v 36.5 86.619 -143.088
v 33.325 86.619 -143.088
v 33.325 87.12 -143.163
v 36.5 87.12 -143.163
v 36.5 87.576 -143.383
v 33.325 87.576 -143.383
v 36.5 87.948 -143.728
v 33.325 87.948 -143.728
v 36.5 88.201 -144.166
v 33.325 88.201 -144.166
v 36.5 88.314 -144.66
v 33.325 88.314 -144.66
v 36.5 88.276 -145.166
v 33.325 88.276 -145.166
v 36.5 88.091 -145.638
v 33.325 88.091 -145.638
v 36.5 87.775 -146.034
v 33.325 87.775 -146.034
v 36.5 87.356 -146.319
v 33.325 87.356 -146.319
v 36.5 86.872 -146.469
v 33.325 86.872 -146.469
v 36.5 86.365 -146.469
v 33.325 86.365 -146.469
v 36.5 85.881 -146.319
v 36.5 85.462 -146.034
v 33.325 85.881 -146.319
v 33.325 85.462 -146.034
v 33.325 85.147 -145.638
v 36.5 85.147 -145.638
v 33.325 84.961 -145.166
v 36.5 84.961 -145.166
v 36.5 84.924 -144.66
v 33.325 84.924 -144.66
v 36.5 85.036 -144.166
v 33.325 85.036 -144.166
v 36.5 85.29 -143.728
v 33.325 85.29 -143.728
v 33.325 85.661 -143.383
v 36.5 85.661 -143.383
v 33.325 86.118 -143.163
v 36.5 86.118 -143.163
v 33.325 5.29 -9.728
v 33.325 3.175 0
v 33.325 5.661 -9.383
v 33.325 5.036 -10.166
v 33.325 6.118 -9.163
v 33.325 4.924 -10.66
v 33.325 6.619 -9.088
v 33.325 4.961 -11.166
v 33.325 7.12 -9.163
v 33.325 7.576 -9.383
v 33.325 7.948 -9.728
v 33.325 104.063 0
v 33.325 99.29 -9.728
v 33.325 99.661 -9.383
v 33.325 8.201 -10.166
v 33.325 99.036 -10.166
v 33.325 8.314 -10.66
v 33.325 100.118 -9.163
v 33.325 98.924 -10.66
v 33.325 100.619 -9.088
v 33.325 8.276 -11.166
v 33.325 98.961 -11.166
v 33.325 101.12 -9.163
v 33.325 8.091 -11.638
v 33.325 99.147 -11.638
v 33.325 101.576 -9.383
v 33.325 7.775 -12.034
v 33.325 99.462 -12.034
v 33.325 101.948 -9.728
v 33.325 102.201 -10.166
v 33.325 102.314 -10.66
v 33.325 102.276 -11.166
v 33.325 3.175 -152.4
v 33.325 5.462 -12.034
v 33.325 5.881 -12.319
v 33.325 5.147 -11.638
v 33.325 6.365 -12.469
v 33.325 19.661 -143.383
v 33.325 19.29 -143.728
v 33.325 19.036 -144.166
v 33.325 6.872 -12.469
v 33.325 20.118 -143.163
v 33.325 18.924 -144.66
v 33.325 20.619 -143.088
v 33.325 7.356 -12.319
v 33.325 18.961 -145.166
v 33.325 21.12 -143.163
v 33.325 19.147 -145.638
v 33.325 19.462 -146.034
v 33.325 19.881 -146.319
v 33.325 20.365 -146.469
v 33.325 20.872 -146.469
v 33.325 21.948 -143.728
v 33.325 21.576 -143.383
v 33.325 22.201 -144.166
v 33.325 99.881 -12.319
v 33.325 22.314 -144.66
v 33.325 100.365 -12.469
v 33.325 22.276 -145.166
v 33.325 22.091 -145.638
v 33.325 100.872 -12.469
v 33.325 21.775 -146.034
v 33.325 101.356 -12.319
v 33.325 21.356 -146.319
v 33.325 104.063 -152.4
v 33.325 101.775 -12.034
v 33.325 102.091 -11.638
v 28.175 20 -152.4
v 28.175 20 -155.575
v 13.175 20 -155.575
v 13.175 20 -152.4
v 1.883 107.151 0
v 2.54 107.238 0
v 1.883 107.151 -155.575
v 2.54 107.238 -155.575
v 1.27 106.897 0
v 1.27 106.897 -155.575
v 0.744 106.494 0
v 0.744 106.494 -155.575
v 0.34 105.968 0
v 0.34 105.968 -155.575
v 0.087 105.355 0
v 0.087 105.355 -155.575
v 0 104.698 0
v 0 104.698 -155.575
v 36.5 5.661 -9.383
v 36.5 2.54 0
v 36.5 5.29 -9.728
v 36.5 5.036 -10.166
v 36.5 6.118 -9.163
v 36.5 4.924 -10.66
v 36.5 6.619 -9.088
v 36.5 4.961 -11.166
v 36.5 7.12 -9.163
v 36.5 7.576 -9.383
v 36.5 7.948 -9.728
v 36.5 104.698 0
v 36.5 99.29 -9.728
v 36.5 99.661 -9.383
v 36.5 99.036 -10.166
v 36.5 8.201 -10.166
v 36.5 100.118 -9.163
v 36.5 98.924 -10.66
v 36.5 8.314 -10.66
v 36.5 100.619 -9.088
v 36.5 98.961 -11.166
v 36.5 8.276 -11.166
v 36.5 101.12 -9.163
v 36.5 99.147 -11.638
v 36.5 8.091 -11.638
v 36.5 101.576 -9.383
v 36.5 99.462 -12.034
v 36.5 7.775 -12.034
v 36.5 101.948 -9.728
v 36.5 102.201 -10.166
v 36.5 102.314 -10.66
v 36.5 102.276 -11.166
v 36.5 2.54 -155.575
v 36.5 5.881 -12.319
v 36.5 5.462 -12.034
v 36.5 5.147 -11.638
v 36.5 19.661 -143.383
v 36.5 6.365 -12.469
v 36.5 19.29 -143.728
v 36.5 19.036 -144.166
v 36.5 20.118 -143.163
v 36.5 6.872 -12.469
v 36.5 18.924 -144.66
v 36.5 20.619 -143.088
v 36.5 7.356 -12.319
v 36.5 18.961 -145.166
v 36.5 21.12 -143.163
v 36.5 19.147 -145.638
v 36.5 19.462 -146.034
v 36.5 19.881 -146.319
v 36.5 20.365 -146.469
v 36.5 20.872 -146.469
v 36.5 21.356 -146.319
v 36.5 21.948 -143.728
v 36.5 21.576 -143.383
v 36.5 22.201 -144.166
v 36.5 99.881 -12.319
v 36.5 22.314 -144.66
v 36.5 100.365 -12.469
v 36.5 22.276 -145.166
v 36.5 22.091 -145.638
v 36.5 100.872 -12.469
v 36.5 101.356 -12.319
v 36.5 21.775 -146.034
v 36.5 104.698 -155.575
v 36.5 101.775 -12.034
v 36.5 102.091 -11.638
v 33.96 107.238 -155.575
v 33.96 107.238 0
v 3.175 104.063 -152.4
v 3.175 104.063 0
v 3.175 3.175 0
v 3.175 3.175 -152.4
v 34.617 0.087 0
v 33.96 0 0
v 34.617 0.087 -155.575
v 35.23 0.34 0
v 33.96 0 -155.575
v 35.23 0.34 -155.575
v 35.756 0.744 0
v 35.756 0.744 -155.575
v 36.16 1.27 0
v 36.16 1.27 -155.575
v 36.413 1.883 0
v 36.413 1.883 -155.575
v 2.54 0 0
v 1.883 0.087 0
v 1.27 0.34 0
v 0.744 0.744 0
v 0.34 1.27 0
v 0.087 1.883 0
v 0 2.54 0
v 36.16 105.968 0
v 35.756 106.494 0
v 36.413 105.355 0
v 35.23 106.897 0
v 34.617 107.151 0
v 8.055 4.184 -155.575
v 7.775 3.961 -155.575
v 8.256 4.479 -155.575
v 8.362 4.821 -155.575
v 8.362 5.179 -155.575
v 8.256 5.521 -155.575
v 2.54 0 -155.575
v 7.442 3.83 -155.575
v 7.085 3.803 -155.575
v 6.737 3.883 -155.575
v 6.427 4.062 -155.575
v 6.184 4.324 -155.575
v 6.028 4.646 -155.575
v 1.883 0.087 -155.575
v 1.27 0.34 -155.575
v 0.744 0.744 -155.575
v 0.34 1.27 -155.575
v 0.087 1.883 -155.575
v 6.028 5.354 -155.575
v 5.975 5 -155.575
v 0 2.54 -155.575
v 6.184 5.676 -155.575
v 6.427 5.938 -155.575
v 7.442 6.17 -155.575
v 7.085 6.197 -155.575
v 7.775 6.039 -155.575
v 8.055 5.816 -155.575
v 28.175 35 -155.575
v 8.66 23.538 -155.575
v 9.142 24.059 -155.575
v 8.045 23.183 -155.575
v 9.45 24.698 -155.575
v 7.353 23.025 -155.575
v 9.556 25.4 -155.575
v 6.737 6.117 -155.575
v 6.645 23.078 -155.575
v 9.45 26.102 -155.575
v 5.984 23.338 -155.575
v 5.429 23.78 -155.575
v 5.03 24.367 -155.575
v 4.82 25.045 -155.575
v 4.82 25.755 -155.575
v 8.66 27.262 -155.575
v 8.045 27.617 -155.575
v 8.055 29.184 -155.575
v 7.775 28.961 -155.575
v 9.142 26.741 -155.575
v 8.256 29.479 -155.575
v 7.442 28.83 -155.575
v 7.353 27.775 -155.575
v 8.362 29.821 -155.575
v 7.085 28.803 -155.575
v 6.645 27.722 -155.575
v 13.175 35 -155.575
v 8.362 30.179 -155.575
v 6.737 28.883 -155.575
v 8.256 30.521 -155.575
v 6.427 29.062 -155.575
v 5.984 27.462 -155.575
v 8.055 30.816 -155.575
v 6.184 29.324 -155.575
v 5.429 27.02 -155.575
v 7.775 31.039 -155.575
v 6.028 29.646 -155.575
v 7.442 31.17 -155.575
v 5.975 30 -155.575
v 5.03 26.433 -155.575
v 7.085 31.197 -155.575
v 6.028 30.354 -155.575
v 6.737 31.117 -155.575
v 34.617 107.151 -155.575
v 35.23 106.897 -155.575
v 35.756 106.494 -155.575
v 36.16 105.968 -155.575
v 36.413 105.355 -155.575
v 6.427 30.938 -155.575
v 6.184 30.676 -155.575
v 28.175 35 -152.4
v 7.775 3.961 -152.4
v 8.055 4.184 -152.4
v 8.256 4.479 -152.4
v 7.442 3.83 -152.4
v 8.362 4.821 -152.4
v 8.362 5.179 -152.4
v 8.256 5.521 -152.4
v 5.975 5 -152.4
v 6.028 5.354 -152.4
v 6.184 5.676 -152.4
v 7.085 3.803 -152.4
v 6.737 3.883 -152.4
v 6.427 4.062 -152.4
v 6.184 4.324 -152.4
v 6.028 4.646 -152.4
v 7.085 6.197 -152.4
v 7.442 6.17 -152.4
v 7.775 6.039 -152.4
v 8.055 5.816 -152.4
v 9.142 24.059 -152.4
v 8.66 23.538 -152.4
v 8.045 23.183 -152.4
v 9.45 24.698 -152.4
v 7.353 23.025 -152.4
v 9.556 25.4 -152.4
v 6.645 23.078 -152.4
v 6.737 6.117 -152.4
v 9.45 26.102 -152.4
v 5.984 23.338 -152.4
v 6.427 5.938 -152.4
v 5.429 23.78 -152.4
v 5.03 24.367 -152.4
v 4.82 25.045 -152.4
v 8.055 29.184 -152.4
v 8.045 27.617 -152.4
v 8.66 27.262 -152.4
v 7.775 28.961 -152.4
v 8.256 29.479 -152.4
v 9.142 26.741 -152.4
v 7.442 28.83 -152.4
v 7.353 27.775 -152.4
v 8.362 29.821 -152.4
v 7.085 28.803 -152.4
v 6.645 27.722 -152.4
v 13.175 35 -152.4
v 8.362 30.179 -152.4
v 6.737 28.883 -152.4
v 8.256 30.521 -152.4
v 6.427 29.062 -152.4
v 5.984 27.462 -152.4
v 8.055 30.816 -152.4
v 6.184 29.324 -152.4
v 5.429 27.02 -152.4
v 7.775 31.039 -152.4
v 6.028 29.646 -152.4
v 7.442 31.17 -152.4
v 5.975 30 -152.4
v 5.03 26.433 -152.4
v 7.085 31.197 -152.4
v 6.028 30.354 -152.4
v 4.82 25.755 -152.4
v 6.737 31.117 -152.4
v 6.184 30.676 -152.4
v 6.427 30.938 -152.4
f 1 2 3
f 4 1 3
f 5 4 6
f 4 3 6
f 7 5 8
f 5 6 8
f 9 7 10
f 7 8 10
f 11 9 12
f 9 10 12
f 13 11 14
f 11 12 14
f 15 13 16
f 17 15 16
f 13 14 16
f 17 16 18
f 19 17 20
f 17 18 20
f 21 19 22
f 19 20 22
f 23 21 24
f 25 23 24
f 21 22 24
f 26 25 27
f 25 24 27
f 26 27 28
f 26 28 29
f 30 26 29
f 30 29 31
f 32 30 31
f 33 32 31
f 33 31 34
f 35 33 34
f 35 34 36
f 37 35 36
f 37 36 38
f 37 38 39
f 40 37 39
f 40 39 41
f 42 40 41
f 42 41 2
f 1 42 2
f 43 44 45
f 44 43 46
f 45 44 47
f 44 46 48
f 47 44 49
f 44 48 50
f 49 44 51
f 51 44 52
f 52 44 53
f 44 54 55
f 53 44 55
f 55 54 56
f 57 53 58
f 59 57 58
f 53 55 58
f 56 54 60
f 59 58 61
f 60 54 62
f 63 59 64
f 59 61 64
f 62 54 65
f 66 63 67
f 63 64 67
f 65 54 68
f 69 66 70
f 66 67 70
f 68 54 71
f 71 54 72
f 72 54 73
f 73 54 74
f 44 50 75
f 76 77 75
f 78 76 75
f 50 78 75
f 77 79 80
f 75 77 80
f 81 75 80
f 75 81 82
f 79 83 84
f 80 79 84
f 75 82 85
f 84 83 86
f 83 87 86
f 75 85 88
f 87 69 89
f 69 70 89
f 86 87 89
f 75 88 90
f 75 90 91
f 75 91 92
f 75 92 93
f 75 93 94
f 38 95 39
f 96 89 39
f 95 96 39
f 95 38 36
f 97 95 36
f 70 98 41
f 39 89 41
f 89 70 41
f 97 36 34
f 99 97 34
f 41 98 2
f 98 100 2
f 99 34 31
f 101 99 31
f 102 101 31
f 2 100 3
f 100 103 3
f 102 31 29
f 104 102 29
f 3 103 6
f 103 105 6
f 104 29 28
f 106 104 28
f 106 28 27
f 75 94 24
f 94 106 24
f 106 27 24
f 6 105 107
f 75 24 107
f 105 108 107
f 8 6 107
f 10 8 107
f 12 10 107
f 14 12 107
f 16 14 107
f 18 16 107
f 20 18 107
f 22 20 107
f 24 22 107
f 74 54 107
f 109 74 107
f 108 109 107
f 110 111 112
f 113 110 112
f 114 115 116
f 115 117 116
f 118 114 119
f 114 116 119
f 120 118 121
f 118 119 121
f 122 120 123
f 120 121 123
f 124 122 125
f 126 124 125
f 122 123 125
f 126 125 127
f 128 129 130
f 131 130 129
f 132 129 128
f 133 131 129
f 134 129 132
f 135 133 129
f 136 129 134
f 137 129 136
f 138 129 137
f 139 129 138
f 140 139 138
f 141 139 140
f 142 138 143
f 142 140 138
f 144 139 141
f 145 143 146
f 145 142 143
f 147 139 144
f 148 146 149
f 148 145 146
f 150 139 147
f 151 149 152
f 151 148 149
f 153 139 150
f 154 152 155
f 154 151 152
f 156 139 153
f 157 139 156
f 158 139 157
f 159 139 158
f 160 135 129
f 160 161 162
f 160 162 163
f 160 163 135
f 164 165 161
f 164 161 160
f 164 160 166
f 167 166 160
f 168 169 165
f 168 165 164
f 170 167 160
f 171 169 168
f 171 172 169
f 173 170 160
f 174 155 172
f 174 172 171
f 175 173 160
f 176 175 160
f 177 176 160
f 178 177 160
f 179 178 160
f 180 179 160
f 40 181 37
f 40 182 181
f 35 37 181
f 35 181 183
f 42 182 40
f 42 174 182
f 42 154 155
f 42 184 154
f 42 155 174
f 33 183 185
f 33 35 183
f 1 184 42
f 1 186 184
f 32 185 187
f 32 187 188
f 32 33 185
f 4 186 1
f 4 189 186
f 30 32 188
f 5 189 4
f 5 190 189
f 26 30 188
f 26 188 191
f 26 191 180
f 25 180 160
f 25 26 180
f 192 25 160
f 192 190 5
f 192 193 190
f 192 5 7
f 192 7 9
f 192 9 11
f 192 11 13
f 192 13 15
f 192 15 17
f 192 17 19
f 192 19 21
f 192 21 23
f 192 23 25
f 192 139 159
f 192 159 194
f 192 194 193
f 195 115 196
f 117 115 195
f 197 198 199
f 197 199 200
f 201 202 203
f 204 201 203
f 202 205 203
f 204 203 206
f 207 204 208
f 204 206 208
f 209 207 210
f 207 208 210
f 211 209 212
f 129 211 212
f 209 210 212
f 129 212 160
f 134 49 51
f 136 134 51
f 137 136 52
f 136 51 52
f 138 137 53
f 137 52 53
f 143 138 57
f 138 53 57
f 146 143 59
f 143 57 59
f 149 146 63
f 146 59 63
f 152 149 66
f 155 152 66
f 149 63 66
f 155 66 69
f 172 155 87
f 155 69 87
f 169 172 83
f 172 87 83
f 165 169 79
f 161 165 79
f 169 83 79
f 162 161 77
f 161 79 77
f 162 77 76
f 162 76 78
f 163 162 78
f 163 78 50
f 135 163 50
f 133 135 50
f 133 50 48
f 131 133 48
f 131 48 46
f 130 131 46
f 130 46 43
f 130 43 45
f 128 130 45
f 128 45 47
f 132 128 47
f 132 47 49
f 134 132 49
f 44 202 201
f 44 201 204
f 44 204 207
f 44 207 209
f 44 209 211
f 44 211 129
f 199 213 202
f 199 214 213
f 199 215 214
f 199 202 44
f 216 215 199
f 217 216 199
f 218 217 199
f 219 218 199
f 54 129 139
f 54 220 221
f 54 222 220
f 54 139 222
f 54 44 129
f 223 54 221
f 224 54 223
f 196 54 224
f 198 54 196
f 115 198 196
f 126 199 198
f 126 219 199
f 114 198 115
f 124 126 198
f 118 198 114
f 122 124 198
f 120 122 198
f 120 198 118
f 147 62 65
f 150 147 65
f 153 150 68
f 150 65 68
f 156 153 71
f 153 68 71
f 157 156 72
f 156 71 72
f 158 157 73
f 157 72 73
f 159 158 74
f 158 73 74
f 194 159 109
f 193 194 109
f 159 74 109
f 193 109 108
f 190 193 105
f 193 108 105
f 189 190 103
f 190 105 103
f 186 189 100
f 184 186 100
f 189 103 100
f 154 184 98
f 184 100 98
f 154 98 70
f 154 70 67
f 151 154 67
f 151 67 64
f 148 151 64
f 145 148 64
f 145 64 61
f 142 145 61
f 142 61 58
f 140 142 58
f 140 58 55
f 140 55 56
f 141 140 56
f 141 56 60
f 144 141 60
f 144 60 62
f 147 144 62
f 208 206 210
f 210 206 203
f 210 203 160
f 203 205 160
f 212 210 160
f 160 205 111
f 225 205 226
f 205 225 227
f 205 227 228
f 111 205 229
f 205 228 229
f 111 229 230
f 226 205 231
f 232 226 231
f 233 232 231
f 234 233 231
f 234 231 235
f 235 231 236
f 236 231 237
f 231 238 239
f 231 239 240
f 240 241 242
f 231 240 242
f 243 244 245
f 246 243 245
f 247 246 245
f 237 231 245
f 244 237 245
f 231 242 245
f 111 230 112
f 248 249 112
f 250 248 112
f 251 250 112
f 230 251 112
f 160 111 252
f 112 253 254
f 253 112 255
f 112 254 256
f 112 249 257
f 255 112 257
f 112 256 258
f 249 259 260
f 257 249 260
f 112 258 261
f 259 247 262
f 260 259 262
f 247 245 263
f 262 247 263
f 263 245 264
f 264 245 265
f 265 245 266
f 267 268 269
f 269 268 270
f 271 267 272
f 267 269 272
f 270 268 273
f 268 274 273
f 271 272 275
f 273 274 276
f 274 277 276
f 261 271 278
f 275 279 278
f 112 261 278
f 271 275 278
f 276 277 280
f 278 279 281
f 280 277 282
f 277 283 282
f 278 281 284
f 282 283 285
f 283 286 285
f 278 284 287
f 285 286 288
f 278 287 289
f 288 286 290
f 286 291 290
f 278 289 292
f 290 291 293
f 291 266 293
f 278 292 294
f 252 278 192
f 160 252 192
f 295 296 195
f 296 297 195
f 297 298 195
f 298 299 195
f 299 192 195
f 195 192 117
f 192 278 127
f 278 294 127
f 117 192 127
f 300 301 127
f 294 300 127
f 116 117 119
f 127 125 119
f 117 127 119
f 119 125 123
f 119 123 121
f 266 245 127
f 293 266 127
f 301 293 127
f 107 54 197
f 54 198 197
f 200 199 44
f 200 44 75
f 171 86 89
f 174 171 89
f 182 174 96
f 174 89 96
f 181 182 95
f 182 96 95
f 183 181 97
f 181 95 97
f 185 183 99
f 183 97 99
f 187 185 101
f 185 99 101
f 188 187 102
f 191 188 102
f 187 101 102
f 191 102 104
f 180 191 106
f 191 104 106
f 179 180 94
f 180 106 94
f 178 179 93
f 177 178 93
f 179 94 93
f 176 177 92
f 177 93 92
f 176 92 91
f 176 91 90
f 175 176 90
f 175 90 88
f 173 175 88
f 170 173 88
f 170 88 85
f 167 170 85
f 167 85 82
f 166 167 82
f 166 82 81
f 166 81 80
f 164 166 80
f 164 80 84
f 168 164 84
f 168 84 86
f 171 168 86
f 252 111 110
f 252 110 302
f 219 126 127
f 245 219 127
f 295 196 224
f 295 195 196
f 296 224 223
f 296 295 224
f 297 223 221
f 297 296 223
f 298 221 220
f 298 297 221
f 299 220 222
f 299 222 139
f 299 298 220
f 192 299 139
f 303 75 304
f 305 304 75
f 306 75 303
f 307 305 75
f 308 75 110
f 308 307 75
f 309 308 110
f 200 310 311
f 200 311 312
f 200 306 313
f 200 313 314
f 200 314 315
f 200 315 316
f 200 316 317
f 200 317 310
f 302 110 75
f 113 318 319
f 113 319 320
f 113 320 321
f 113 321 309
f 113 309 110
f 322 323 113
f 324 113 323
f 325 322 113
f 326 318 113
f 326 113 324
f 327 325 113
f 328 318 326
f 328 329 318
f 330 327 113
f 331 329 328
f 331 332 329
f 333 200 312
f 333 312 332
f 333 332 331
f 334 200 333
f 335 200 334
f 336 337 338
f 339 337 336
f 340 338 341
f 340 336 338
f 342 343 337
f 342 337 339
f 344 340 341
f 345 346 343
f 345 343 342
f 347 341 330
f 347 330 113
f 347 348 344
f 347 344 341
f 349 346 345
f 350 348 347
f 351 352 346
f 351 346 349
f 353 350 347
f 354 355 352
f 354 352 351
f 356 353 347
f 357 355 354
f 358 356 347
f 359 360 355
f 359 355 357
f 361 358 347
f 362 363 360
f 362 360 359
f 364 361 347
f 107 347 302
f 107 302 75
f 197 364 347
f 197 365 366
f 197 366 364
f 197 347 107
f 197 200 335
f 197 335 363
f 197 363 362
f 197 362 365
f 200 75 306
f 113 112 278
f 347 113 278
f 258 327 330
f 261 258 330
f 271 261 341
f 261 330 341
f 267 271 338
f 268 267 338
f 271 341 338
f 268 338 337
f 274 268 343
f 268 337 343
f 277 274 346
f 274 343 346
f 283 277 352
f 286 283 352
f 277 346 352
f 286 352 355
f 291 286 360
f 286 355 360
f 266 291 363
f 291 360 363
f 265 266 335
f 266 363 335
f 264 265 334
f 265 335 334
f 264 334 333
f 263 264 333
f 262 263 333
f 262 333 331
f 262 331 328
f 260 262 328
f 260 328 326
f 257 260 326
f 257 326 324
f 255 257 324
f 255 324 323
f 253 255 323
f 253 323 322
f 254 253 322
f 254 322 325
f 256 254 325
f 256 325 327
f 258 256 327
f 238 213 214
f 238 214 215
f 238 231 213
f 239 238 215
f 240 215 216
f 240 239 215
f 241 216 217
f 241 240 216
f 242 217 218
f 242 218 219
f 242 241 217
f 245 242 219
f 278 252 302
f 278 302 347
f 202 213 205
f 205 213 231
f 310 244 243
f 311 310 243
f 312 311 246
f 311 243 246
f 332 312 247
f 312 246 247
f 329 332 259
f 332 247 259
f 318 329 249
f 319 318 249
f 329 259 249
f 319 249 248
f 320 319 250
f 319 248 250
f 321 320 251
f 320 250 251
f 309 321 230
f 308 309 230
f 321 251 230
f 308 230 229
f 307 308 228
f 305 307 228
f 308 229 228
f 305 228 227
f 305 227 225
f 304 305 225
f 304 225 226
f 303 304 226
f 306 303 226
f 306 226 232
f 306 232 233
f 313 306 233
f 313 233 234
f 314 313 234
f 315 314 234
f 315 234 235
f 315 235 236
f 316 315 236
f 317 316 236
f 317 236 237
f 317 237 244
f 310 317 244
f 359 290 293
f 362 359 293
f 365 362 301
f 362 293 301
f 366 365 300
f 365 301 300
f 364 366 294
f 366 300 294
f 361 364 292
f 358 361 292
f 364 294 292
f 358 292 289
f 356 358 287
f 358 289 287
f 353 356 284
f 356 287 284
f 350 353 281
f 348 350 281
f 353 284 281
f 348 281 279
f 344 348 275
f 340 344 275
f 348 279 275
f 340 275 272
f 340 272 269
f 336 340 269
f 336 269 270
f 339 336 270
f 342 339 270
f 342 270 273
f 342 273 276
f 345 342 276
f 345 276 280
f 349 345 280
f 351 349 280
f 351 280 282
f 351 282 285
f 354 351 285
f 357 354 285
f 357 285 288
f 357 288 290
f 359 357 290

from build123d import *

# Parameters (mm, degrees)
SKETCH1_W                = 155.575
SKETCH1_H                = 107.237500028
BOSS_EXTRUDE1_DEPTH      = 36.5
SHELL2_T                 = -3.175
FILLET1_R                = 2.54
CUT_EXTRUDE2_REACH       = 194.447
SKETCH7_R                = 1.2
SKETCH7_W                = 15
SKETCH7_H                = 15
SKETCH8_R                = 2.38125
CUT_EXTRUDE3_DEPTH       = 190.889155594
M3_CLEARANCE_HOLE1_D     = 3.4
M3_CLEARANCE_HOLE1_DEPTH = 3.175


with BuildPart() as part:
    # Sketch1 → Boss-Extrude1 (new body)
    with BuildSketch(Plane(origin=(0, 0, 0), x_dir=(0, 0, -1), z_dir=(1, 0, 0))):
        with Locations((77.7875, 53.618750014)):
            Rectangle(SKETCH1_W, SKETCH1_H)
    extrude(amount=BOSS_EXTRUDE1_DEPTH)

    # Shell2
    shell2_openings = [part.faces().sort_by_distance(p)[0] for p in [
        (18.25, 53.618750014, 0),
    ]]
    offset(amount=SHELL2_T, openings=shell2_openings, kind=Kind.INTERSECTION)

    # Fillet1
    fillet1_edges = [part.edges().sort_by_distance(p)[0] for p in [
        (36.5, 107.237500028, -77.7875),
        (0, 107.237500028, -77.7875),
        (0, 0, -77.7875),
        (36.5, 0, -77.7875),
    ]]
    fillet(fillet1_edges, radius=FILLET1_R)

    # Sketch7 → Cut-Extrude2 (cut, up to next)
    with BuildSketch(Plane(origin=(0, 0, -155.575), x_dir=(-1, 0, 0), z_dir=(0, 0, -1)), mode=Mode.PRIVATE) as cut_extrude2_sk1:
        with Locations((-7.175, 30)):
            Circle(SKETCH7_R)
    cut_extrude2_tool1 = extrude(cut_extrude2_sk1.sketch, amount=-CUT_EXTRUDE2_REACH, mode=Mode.PRIVATE) & part.part
    # Sketch7 → Cut-Extrude2 (cut, up to next)
    with BuildSketch(Plane(origin=(0, 0, -155.575), x_dir=(-1, 0, 0), z_dir=(0, 0, -1)), mode=Mode.PRIVATE) as cut_extrude2_sk2:
        with Locations((-7.175, 5)):
            Circle(SKETCH7_R)
    cut_extrude2_tool2 = extrude(cut_extrude2_sk2.sketch, amount=-CUT_EXTRUDE2_REACH, mode=Mode.PRIVATE) & part.part
    # Sketch7 → Cut-Extrude2 (cut, up to next)
    with BuildSketch(Plane(origin=(0, 0, -155.575), x_dir=(-1, 0, 0), z_dir=(0, 0, -1)), mode=Mode.PRIVATE) as cut_extrude2_sk3:
        with Locations((-20.675, 27.5)):
            Rectangle(SKETCH7_W, SKETCH7_H)
    cut_extrude2_tool3 = extrude(cut_extrude2_sk3.sketch, amount=-CUT_EXTRUDE2_REACH, mode=Mode.PRIVATE) & part.part
    add(cut_extrude2_tool1.solids().sort_by_distance((7.175, 30, -155.575))[0], mode=Mode.SUBTRACT)
    add(cut_extrude2_tool2.solids().sort_by_distance((7.175, 5, -155.575))[0], mode=Mode.SUBTRACT)
    add(cut_extrude2_tool3.solids().sort_by_distance((20.675, 27.5, -155.575))[0], mode=Mode.SUBTRACT)

    # Sketch8 → Cut-Extrude3 (cut, through all)
    with BuildSketch(Plane.XY.offset(-152.4)):
        with Locations((7.175, 25.4)):
            Circle(SKETCH8_R)
    extrude(amount=-CUT_EXTRUDE3_DEPTH, mode=Mode.SUBTRACT)

    # M3 Clearance Hole1
    with Locations(Plane(origin=(36.5, 0, 0), x_dir=(0, 0, -1), z_dir=(1, 0, 0))):
        with Locations((144.7875, 86.618750014), (144.7875, 20.618750014), (10.7875, 6.618750014), (10.7875, 100.618750014)):
            Hole(M3_CLEARANCE_HOLE1_D / 2, depth=M3_CLEARANCE_HOLE1_DEPTH)


solid = part.part
